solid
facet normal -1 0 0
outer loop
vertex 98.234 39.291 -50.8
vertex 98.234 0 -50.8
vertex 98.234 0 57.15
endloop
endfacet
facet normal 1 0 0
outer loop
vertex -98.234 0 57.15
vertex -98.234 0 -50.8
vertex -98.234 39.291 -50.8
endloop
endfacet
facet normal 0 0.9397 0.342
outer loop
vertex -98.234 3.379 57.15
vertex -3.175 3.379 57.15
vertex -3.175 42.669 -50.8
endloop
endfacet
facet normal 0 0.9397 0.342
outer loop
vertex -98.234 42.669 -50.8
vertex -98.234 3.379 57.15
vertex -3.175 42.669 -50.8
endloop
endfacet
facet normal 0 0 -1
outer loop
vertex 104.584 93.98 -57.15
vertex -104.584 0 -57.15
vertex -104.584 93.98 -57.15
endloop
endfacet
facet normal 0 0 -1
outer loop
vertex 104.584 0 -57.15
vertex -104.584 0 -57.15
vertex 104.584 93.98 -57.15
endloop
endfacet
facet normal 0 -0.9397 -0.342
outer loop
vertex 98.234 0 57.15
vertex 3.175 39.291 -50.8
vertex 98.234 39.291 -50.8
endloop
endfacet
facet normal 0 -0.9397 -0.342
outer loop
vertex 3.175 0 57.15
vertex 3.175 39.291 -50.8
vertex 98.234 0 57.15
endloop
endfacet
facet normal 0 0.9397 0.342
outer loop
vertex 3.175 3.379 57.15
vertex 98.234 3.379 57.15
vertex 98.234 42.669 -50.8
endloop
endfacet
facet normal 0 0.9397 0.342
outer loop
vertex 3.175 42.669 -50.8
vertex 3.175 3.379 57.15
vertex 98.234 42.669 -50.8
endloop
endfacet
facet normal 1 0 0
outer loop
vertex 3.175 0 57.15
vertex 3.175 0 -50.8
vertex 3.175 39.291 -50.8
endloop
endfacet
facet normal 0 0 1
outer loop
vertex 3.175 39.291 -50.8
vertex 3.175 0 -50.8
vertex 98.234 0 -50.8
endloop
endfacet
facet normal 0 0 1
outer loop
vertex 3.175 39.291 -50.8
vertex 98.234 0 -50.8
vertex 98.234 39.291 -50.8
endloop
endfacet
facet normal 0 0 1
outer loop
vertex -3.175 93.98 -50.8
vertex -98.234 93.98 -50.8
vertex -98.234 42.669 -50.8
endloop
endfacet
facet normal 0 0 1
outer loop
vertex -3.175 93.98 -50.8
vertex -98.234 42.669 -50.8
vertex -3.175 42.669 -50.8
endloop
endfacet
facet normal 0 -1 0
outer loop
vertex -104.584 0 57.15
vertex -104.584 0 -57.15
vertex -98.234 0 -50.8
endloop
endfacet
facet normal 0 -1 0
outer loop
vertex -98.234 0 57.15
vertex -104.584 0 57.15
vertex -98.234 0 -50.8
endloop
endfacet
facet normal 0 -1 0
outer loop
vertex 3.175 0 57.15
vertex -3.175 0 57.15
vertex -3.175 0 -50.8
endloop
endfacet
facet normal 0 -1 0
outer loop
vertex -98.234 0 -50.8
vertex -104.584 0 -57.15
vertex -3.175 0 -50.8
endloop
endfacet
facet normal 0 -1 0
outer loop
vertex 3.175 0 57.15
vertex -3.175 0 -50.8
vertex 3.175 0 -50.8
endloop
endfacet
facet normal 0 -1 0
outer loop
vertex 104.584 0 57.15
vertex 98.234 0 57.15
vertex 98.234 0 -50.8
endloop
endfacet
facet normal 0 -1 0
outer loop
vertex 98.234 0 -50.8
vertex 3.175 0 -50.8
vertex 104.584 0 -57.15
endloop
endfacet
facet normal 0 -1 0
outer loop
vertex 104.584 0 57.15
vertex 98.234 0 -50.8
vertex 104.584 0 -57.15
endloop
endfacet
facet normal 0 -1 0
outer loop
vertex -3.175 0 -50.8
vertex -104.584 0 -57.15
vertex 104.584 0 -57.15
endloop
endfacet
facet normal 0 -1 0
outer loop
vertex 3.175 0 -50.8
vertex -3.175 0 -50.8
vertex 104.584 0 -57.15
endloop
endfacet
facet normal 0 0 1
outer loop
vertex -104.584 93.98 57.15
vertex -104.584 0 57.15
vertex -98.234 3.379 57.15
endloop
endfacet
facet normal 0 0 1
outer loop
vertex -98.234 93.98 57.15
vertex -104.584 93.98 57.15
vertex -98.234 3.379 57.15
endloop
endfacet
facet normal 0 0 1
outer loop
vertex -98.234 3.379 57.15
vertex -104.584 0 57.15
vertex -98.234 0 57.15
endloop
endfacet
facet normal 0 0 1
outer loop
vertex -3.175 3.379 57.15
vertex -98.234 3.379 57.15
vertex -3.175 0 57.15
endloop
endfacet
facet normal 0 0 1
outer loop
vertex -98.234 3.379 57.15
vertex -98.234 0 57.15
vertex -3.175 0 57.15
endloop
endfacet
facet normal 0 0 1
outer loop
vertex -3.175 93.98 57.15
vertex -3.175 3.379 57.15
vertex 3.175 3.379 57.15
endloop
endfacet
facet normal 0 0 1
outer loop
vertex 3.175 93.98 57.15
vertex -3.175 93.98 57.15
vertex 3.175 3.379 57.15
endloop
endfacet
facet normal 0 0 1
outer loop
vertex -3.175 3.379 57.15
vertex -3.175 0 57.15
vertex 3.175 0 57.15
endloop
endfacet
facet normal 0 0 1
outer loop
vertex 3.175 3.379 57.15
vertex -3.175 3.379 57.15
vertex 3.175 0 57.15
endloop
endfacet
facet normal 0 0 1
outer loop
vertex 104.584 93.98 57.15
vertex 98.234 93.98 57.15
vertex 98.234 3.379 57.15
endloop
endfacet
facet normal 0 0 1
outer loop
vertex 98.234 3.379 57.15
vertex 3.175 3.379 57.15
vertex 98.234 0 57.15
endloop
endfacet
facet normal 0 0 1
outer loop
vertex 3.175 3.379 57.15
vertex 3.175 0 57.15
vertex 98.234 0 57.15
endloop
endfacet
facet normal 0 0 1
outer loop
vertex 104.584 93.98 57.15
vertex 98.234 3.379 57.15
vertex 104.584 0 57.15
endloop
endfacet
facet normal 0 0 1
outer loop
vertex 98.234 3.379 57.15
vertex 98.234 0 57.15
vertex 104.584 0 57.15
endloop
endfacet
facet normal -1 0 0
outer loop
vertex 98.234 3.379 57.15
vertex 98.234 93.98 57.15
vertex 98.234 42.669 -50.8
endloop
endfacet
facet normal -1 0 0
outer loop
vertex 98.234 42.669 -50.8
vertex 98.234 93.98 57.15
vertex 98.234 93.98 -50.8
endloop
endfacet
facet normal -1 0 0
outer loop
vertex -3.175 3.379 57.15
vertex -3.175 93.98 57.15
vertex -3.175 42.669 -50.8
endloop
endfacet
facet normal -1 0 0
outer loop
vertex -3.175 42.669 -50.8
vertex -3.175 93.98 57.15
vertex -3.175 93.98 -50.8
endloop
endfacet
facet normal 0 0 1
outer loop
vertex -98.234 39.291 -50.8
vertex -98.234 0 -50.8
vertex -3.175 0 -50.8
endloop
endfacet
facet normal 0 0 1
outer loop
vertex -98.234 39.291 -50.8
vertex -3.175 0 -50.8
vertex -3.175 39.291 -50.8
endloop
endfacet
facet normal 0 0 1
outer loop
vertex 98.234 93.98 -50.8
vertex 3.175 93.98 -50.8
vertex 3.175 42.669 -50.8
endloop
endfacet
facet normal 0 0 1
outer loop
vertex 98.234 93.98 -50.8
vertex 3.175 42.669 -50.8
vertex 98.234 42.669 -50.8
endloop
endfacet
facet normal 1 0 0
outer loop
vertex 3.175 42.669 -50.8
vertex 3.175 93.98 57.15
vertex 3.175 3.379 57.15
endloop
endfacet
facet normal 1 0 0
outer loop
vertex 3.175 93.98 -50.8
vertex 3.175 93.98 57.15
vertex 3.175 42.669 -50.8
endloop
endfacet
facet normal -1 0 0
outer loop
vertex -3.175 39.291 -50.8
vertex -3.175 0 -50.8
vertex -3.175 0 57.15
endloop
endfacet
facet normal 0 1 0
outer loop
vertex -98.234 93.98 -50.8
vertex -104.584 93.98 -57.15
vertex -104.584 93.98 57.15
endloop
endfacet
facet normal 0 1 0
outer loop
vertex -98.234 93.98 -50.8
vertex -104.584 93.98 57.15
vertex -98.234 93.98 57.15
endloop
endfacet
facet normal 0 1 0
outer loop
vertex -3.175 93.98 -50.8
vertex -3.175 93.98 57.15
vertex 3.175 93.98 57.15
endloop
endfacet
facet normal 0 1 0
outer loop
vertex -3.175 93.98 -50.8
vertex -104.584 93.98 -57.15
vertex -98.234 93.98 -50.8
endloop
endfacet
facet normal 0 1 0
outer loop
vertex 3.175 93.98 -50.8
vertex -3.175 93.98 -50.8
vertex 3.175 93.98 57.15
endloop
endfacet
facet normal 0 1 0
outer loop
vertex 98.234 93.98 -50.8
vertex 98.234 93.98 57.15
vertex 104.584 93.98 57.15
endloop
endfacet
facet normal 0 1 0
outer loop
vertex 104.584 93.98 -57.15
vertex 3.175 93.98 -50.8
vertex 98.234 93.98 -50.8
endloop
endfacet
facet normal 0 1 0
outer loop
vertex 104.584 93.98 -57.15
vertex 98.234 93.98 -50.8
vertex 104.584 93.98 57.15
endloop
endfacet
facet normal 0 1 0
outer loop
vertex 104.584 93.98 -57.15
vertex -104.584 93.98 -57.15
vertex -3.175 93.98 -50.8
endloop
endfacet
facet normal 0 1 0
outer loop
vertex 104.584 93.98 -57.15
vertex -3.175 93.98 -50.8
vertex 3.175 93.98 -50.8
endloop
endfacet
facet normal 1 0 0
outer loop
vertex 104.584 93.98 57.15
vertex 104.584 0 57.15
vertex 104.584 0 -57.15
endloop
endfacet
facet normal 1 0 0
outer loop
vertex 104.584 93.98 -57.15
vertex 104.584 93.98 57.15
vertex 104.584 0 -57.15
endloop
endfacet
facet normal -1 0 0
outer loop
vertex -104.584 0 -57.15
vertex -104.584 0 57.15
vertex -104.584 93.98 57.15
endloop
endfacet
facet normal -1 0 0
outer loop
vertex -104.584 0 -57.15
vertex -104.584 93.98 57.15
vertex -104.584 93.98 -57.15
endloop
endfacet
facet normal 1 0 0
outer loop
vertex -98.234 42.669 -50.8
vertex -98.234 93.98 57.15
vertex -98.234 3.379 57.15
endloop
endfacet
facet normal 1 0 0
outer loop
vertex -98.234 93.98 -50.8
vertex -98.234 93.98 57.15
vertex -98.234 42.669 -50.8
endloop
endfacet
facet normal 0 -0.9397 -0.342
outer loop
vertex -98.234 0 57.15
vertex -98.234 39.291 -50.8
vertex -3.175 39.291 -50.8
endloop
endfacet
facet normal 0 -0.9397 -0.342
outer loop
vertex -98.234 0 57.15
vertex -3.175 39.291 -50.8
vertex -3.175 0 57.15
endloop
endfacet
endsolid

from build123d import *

# Parameters (mm, degrees)
SKETCH1_W            = 209.169
SKETCH1_H            = 114.3
BOX_DEPTH            = 93.98
CUT_EXTRUDE1_REACH   = 153.777
SKETCH2_W            = 95.0595
SKETCH2_H            = 107.95
CUT_EXTRUDE2_START   = -98.2345
CUT_EXTRUDE2_DEPTH   = 95.0595
CUT_EXTRUDE2_START_2 = 3.175
CUT_EXTRUDE2_2_DEPTH = 95.0595


# Read off the part's stored shape, not the designer's step: Cut-Extrude2
with BuildPart() as part:
    # Sketch1 → Box (new body)
    with BuildSketch(Plane(origin=(0, 0, 0), x_dir=(1, 0, 0), z_dir=(0, 1, 0))):
        Rectangle(SKETCH1_W, SKETCH1_H)
    extrude(amount=BOX_DEPTH)

    # Cut-Extrude1: up to this plane
    cut_extrude1_end = Plane(origin=(0, 21.351180018, 7.771193993), z_dir=(0, -0.9396926207859081, -0.34202014332566943))
    # Sketch2 → Cut-Extrude1 (cut, up to the surface)
    with BuildSketch(Plane(origin=(0, 93.98, 0), x_dir=(1, 0, 0), z_dir=(0, 1, 0)), mode=Mode.PRIVATE) as cut_extrude1_sk1:
        with Locations((-50.70475, -3.175)):
            Rectangle(SKETCH2_W, SKETCH2_H)
    cut_extrude1_tool1 = split(extrude(cut_extrude1_sk1.sketch, amount=-CUT_EXTRUDE1_REACH, mode=Mode.PRIVATE), bisect_by=cut_extrude1_end, keep=Keep.BOTH, mode=Mode.PRIVATE)
    add(cut_extrude1_tool1.solids().sort_by_distance((-50.70475, 93.98, 3.175))[0], mode=Mode.SUBTRACT)
    # Sketch2 → Cut-Extrude1 (cut, up to the surface)
    with BuildSketch(Plane(origin=(0, 93.98, 0), x_dir=(1, 0, 0), z_dir=(0, 1, 0)), mode=Mode.PRIVATE) as cut_extrude1_sk2:
        with Locations((50.70475, -3.175)):
            Rectangle(SKETCH2_W, SKETCH2_H)
    cut_extrude1_tool2 = split(extrude(cut_extrude1_sk2.sketch, amount=-CUT_EXTRUDE1_REACH, mode=Mode.PRIVATE), bisect_by=cut_extrude1_end, keep=Keep.BOTH, mode=Mode.PRIVATE)
    add(cut_extrude1_tool2.solids().sort_by_distance((50.70475, 93.98, 3.175))[0], mode=Mode.SUBTRACT)

    # Cut-Extrude2 outline → Cut-Extrude2 (cut)
    with BuildSketch(Plane.YZ.offset(CUT_EXTRUDE2_START)):
        Polygon((0, 57.15), (0, -50.8), (39.290586789, -50.8), align=None)
    extrude(amount=CUT_EXTRUDE2_DEPTH, mode=Mode.SUBTRACT)

    # Cut-Extrude2 2 outline → Cut-Extrude2 2 (cut)
    with BuildSketch(Plane.YZ.offset(CUT_EXTRUDE2_START_2)):
        Polygon((0, 57.15), (0, -50.8), (39.290586789, -50.8), align=None)
    extrude(amount=CUT_EXTRUDE2_2_DEPTH, mode=Mode.SUBTRACT)


solid = part.part
